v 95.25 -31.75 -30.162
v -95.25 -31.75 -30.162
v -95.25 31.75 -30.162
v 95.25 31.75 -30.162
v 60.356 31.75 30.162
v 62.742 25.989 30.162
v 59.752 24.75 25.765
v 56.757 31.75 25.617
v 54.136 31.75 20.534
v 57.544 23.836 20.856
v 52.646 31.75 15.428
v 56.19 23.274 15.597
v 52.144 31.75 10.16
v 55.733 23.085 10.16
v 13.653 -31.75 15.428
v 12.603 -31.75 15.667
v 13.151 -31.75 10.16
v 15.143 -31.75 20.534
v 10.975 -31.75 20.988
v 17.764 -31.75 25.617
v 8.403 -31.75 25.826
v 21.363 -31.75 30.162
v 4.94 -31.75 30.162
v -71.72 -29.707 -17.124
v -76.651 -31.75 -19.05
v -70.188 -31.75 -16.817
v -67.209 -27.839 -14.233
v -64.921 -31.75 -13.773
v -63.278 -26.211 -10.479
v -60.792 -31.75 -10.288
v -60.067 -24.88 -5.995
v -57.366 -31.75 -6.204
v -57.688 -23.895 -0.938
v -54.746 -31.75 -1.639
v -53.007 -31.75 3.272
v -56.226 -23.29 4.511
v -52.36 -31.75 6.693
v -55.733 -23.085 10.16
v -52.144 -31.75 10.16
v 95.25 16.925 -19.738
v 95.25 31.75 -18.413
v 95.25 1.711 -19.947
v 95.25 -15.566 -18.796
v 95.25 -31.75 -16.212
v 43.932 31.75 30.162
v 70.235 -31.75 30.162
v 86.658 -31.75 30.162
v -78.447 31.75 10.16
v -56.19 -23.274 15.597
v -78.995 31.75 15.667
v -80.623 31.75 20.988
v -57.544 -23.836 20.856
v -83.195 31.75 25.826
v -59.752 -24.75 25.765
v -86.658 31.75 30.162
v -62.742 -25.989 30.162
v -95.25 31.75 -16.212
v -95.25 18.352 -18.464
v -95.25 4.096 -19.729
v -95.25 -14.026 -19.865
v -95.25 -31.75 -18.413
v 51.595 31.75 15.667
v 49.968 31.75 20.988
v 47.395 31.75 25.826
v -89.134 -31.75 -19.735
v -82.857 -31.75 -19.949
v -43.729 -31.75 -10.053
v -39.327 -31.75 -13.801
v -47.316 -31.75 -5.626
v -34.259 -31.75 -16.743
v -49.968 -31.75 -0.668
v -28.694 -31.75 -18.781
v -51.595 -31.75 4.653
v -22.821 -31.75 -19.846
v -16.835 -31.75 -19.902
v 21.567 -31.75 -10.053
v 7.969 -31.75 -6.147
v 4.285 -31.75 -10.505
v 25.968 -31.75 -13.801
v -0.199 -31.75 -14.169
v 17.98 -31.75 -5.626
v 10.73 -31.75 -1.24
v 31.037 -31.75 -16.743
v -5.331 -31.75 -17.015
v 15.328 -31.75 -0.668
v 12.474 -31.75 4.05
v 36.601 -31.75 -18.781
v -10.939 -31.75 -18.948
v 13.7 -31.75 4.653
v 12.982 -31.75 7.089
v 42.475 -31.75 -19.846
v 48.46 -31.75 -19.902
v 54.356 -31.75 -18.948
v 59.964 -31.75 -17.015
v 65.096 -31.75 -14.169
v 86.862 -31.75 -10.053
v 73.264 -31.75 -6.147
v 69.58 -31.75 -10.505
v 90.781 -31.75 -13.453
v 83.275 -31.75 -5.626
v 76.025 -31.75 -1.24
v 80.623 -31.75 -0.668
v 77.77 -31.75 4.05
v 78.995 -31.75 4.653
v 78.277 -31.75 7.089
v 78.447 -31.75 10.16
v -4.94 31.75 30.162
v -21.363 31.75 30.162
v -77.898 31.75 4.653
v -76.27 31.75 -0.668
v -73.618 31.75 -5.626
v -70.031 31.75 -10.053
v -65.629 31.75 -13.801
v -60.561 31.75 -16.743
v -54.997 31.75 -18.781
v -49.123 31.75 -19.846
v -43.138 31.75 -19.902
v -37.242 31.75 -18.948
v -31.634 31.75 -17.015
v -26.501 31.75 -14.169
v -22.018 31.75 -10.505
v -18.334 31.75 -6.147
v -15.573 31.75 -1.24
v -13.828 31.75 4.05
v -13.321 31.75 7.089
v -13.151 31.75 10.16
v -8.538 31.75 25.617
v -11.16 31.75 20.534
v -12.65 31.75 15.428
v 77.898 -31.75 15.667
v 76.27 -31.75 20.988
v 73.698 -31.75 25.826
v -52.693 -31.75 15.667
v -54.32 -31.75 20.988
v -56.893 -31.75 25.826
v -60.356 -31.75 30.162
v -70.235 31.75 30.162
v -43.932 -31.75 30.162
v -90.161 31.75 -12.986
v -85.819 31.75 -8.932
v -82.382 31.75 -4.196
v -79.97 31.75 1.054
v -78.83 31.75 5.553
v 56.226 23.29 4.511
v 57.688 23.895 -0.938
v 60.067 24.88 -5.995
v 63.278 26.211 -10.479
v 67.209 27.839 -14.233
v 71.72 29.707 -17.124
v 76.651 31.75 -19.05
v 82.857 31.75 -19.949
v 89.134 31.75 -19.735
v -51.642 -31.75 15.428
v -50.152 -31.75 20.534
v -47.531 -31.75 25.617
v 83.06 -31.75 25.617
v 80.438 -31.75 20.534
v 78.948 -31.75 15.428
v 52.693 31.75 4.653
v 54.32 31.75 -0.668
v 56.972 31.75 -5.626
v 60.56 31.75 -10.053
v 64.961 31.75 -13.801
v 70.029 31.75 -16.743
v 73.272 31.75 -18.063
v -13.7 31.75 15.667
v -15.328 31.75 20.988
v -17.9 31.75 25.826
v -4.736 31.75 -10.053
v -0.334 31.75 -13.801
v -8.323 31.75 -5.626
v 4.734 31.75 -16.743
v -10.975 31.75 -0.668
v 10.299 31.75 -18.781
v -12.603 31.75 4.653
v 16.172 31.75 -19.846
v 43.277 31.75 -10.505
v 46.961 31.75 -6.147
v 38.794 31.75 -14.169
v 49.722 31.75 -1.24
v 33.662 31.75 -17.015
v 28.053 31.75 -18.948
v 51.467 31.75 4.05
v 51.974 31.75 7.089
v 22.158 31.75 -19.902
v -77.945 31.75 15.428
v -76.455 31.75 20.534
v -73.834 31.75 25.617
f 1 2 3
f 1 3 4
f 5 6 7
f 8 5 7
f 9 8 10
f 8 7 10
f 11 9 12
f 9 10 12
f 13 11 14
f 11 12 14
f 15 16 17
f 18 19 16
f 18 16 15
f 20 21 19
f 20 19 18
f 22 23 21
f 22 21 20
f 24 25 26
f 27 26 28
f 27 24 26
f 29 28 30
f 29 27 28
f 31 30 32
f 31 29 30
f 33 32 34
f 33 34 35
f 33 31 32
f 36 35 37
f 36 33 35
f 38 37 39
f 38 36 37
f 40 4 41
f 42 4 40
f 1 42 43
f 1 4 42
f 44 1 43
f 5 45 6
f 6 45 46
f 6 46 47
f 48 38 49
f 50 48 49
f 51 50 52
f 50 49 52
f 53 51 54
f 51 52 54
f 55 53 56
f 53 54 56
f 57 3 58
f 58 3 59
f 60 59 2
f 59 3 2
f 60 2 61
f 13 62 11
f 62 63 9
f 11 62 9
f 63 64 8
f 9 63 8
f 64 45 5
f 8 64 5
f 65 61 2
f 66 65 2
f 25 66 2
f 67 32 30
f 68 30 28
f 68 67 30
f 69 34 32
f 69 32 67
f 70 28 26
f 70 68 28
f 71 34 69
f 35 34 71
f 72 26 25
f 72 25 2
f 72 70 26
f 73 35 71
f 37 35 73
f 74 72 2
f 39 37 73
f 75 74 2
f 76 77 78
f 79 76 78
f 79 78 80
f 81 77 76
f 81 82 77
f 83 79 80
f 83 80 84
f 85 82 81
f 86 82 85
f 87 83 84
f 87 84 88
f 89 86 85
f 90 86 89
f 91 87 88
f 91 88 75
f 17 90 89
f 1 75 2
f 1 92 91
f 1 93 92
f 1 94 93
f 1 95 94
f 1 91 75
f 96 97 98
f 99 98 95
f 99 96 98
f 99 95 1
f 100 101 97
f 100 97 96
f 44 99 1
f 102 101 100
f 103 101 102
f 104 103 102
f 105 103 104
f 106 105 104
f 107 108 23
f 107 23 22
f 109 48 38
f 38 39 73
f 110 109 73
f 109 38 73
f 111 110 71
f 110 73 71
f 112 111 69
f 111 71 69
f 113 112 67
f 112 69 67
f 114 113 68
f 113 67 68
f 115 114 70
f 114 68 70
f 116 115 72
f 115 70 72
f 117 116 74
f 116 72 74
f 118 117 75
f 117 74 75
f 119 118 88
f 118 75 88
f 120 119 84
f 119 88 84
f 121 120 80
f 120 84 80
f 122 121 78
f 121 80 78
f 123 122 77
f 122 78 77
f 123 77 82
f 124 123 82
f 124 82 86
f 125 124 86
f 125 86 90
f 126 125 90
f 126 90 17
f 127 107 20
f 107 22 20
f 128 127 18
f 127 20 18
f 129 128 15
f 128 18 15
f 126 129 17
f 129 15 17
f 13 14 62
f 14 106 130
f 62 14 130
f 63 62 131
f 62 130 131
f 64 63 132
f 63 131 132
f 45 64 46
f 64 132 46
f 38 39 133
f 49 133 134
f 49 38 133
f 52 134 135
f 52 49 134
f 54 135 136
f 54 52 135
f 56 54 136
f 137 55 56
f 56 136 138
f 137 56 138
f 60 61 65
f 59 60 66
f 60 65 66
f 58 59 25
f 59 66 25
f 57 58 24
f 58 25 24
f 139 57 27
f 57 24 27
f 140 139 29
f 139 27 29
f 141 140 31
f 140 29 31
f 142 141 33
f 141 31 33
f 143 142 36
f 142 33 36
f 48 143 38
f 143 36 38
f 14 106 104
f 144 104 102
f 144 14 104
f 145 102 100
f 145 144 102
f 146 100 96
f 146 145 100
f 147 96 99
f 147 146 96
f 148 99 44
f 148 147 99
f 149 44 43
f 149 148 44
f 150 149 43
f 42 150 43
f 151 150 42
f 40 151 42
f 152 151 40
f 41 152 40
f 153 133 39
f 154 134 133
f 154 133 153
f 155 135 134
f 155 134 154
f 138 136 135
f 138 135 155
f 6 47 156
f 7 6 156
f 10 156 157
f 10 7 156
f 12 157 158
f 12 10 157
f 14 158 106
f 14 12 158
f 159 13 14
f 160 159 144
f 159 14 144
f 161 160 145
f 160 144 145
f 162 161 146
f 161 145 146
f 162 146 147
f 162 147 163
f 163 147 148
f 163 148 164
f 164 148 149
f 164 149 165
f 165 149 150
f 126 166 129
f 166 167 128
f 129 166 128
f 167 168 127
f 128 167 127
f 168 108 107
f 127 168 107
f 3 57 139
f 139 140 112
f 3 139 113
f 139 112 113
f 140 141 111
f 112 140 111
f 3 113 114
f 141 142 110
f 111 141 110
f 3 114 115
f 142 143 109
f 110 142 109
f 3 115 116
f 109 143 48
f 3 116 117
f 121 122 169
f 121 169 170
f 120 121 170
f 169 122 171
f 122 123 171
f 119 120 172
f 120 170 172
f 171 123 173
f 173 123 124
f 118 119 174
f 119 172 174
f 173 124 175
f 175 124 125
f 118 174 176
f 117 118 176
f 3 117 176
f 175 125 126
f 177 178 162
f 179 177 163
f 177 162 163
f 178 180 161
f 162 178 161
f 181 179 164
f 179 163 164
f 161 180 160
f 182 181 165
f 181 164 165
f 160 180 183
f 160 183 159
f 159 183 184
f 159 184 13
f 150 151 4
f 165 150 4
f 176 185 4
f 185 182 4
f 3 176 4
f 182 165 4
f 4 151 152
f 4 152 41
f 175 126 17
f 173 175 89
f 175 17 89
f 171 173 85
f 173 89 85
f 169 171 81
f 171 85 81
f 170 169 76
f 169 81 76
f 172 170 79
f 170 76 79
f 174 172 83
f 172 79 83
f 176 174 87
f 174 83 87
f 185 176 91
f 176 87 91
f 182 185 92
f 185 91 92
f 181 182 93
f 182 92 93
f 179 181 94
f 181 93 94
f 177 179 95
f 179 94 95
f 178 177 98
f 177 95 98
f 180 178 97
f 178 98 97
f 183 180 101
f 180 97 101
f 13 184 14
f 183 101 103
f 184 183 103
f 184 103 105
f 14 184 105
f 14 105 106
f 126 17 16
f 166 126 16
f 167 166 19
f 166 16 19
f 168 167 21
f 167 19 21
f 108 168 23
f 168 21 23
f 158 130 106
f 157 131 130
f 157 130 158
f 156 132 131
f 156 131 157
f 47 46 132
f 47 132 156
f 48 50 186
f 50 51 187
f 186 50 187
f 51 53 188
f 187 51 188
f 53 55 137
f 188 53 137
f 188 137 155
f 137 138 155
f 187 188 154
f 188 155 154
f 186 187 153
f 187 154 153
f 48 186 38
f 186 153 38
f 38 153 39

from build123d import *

# Parameters (mm, degrees)
F0_W     = 190.5
F0_H     = 60.325
F1_DEPTH = 31.75
F4_R     = 30.1625
F5_DEPTH = 88.9


with BuildPart() as f1:
    # F0 (on Front) → F1 (new body, symmetric)
    with BuildSketch(Plane.XZ):
        Rectangle(F0_W, F0_H)
    extrude(amount=F1_DEPTH, both=True)

    # F4 (on line) → F5 (cut, symmetric)
    with BuildSketch(Plane(origin=(0, 0, 0), x_dir=(0.9238795325, 0.3826834324, 0), z_dir=(0.3826834324, -0.9238795325, 0))):
        with Locations((-90.4875, 10.16)):
            Circle(F4_R)
        with BuildLine():
            ThreePointArc((0, 10.16), (-30.1625, 40.3225), (-60.325, 10.16))
            ThreePointArc((-60.325, 10.16), (-30.1625, -20.0025), (0, 10.16))
        make_face()
        with BuildLine():
            ThreePointArc((60.325, 10.16), (30.1625, 40.3225), (0, 10.16))
            ThreePointArc((0, 10.16), (30.1625, -20.0025), (60.325, 10.16))
        make_face()
        with BuildLine():
            ThreePointArc((120.65, 10.16), (90.4875, 40.3225), (60.325, 10.16))
            ThreePointArc((60.325, 10.16), (90.4875, -20.0025), (120.65, 10.16))
        make_face()
    extrude(amount=F5_DEPTH, both=True, mode=Mode.SUBTRACT)


solid = f1.part
